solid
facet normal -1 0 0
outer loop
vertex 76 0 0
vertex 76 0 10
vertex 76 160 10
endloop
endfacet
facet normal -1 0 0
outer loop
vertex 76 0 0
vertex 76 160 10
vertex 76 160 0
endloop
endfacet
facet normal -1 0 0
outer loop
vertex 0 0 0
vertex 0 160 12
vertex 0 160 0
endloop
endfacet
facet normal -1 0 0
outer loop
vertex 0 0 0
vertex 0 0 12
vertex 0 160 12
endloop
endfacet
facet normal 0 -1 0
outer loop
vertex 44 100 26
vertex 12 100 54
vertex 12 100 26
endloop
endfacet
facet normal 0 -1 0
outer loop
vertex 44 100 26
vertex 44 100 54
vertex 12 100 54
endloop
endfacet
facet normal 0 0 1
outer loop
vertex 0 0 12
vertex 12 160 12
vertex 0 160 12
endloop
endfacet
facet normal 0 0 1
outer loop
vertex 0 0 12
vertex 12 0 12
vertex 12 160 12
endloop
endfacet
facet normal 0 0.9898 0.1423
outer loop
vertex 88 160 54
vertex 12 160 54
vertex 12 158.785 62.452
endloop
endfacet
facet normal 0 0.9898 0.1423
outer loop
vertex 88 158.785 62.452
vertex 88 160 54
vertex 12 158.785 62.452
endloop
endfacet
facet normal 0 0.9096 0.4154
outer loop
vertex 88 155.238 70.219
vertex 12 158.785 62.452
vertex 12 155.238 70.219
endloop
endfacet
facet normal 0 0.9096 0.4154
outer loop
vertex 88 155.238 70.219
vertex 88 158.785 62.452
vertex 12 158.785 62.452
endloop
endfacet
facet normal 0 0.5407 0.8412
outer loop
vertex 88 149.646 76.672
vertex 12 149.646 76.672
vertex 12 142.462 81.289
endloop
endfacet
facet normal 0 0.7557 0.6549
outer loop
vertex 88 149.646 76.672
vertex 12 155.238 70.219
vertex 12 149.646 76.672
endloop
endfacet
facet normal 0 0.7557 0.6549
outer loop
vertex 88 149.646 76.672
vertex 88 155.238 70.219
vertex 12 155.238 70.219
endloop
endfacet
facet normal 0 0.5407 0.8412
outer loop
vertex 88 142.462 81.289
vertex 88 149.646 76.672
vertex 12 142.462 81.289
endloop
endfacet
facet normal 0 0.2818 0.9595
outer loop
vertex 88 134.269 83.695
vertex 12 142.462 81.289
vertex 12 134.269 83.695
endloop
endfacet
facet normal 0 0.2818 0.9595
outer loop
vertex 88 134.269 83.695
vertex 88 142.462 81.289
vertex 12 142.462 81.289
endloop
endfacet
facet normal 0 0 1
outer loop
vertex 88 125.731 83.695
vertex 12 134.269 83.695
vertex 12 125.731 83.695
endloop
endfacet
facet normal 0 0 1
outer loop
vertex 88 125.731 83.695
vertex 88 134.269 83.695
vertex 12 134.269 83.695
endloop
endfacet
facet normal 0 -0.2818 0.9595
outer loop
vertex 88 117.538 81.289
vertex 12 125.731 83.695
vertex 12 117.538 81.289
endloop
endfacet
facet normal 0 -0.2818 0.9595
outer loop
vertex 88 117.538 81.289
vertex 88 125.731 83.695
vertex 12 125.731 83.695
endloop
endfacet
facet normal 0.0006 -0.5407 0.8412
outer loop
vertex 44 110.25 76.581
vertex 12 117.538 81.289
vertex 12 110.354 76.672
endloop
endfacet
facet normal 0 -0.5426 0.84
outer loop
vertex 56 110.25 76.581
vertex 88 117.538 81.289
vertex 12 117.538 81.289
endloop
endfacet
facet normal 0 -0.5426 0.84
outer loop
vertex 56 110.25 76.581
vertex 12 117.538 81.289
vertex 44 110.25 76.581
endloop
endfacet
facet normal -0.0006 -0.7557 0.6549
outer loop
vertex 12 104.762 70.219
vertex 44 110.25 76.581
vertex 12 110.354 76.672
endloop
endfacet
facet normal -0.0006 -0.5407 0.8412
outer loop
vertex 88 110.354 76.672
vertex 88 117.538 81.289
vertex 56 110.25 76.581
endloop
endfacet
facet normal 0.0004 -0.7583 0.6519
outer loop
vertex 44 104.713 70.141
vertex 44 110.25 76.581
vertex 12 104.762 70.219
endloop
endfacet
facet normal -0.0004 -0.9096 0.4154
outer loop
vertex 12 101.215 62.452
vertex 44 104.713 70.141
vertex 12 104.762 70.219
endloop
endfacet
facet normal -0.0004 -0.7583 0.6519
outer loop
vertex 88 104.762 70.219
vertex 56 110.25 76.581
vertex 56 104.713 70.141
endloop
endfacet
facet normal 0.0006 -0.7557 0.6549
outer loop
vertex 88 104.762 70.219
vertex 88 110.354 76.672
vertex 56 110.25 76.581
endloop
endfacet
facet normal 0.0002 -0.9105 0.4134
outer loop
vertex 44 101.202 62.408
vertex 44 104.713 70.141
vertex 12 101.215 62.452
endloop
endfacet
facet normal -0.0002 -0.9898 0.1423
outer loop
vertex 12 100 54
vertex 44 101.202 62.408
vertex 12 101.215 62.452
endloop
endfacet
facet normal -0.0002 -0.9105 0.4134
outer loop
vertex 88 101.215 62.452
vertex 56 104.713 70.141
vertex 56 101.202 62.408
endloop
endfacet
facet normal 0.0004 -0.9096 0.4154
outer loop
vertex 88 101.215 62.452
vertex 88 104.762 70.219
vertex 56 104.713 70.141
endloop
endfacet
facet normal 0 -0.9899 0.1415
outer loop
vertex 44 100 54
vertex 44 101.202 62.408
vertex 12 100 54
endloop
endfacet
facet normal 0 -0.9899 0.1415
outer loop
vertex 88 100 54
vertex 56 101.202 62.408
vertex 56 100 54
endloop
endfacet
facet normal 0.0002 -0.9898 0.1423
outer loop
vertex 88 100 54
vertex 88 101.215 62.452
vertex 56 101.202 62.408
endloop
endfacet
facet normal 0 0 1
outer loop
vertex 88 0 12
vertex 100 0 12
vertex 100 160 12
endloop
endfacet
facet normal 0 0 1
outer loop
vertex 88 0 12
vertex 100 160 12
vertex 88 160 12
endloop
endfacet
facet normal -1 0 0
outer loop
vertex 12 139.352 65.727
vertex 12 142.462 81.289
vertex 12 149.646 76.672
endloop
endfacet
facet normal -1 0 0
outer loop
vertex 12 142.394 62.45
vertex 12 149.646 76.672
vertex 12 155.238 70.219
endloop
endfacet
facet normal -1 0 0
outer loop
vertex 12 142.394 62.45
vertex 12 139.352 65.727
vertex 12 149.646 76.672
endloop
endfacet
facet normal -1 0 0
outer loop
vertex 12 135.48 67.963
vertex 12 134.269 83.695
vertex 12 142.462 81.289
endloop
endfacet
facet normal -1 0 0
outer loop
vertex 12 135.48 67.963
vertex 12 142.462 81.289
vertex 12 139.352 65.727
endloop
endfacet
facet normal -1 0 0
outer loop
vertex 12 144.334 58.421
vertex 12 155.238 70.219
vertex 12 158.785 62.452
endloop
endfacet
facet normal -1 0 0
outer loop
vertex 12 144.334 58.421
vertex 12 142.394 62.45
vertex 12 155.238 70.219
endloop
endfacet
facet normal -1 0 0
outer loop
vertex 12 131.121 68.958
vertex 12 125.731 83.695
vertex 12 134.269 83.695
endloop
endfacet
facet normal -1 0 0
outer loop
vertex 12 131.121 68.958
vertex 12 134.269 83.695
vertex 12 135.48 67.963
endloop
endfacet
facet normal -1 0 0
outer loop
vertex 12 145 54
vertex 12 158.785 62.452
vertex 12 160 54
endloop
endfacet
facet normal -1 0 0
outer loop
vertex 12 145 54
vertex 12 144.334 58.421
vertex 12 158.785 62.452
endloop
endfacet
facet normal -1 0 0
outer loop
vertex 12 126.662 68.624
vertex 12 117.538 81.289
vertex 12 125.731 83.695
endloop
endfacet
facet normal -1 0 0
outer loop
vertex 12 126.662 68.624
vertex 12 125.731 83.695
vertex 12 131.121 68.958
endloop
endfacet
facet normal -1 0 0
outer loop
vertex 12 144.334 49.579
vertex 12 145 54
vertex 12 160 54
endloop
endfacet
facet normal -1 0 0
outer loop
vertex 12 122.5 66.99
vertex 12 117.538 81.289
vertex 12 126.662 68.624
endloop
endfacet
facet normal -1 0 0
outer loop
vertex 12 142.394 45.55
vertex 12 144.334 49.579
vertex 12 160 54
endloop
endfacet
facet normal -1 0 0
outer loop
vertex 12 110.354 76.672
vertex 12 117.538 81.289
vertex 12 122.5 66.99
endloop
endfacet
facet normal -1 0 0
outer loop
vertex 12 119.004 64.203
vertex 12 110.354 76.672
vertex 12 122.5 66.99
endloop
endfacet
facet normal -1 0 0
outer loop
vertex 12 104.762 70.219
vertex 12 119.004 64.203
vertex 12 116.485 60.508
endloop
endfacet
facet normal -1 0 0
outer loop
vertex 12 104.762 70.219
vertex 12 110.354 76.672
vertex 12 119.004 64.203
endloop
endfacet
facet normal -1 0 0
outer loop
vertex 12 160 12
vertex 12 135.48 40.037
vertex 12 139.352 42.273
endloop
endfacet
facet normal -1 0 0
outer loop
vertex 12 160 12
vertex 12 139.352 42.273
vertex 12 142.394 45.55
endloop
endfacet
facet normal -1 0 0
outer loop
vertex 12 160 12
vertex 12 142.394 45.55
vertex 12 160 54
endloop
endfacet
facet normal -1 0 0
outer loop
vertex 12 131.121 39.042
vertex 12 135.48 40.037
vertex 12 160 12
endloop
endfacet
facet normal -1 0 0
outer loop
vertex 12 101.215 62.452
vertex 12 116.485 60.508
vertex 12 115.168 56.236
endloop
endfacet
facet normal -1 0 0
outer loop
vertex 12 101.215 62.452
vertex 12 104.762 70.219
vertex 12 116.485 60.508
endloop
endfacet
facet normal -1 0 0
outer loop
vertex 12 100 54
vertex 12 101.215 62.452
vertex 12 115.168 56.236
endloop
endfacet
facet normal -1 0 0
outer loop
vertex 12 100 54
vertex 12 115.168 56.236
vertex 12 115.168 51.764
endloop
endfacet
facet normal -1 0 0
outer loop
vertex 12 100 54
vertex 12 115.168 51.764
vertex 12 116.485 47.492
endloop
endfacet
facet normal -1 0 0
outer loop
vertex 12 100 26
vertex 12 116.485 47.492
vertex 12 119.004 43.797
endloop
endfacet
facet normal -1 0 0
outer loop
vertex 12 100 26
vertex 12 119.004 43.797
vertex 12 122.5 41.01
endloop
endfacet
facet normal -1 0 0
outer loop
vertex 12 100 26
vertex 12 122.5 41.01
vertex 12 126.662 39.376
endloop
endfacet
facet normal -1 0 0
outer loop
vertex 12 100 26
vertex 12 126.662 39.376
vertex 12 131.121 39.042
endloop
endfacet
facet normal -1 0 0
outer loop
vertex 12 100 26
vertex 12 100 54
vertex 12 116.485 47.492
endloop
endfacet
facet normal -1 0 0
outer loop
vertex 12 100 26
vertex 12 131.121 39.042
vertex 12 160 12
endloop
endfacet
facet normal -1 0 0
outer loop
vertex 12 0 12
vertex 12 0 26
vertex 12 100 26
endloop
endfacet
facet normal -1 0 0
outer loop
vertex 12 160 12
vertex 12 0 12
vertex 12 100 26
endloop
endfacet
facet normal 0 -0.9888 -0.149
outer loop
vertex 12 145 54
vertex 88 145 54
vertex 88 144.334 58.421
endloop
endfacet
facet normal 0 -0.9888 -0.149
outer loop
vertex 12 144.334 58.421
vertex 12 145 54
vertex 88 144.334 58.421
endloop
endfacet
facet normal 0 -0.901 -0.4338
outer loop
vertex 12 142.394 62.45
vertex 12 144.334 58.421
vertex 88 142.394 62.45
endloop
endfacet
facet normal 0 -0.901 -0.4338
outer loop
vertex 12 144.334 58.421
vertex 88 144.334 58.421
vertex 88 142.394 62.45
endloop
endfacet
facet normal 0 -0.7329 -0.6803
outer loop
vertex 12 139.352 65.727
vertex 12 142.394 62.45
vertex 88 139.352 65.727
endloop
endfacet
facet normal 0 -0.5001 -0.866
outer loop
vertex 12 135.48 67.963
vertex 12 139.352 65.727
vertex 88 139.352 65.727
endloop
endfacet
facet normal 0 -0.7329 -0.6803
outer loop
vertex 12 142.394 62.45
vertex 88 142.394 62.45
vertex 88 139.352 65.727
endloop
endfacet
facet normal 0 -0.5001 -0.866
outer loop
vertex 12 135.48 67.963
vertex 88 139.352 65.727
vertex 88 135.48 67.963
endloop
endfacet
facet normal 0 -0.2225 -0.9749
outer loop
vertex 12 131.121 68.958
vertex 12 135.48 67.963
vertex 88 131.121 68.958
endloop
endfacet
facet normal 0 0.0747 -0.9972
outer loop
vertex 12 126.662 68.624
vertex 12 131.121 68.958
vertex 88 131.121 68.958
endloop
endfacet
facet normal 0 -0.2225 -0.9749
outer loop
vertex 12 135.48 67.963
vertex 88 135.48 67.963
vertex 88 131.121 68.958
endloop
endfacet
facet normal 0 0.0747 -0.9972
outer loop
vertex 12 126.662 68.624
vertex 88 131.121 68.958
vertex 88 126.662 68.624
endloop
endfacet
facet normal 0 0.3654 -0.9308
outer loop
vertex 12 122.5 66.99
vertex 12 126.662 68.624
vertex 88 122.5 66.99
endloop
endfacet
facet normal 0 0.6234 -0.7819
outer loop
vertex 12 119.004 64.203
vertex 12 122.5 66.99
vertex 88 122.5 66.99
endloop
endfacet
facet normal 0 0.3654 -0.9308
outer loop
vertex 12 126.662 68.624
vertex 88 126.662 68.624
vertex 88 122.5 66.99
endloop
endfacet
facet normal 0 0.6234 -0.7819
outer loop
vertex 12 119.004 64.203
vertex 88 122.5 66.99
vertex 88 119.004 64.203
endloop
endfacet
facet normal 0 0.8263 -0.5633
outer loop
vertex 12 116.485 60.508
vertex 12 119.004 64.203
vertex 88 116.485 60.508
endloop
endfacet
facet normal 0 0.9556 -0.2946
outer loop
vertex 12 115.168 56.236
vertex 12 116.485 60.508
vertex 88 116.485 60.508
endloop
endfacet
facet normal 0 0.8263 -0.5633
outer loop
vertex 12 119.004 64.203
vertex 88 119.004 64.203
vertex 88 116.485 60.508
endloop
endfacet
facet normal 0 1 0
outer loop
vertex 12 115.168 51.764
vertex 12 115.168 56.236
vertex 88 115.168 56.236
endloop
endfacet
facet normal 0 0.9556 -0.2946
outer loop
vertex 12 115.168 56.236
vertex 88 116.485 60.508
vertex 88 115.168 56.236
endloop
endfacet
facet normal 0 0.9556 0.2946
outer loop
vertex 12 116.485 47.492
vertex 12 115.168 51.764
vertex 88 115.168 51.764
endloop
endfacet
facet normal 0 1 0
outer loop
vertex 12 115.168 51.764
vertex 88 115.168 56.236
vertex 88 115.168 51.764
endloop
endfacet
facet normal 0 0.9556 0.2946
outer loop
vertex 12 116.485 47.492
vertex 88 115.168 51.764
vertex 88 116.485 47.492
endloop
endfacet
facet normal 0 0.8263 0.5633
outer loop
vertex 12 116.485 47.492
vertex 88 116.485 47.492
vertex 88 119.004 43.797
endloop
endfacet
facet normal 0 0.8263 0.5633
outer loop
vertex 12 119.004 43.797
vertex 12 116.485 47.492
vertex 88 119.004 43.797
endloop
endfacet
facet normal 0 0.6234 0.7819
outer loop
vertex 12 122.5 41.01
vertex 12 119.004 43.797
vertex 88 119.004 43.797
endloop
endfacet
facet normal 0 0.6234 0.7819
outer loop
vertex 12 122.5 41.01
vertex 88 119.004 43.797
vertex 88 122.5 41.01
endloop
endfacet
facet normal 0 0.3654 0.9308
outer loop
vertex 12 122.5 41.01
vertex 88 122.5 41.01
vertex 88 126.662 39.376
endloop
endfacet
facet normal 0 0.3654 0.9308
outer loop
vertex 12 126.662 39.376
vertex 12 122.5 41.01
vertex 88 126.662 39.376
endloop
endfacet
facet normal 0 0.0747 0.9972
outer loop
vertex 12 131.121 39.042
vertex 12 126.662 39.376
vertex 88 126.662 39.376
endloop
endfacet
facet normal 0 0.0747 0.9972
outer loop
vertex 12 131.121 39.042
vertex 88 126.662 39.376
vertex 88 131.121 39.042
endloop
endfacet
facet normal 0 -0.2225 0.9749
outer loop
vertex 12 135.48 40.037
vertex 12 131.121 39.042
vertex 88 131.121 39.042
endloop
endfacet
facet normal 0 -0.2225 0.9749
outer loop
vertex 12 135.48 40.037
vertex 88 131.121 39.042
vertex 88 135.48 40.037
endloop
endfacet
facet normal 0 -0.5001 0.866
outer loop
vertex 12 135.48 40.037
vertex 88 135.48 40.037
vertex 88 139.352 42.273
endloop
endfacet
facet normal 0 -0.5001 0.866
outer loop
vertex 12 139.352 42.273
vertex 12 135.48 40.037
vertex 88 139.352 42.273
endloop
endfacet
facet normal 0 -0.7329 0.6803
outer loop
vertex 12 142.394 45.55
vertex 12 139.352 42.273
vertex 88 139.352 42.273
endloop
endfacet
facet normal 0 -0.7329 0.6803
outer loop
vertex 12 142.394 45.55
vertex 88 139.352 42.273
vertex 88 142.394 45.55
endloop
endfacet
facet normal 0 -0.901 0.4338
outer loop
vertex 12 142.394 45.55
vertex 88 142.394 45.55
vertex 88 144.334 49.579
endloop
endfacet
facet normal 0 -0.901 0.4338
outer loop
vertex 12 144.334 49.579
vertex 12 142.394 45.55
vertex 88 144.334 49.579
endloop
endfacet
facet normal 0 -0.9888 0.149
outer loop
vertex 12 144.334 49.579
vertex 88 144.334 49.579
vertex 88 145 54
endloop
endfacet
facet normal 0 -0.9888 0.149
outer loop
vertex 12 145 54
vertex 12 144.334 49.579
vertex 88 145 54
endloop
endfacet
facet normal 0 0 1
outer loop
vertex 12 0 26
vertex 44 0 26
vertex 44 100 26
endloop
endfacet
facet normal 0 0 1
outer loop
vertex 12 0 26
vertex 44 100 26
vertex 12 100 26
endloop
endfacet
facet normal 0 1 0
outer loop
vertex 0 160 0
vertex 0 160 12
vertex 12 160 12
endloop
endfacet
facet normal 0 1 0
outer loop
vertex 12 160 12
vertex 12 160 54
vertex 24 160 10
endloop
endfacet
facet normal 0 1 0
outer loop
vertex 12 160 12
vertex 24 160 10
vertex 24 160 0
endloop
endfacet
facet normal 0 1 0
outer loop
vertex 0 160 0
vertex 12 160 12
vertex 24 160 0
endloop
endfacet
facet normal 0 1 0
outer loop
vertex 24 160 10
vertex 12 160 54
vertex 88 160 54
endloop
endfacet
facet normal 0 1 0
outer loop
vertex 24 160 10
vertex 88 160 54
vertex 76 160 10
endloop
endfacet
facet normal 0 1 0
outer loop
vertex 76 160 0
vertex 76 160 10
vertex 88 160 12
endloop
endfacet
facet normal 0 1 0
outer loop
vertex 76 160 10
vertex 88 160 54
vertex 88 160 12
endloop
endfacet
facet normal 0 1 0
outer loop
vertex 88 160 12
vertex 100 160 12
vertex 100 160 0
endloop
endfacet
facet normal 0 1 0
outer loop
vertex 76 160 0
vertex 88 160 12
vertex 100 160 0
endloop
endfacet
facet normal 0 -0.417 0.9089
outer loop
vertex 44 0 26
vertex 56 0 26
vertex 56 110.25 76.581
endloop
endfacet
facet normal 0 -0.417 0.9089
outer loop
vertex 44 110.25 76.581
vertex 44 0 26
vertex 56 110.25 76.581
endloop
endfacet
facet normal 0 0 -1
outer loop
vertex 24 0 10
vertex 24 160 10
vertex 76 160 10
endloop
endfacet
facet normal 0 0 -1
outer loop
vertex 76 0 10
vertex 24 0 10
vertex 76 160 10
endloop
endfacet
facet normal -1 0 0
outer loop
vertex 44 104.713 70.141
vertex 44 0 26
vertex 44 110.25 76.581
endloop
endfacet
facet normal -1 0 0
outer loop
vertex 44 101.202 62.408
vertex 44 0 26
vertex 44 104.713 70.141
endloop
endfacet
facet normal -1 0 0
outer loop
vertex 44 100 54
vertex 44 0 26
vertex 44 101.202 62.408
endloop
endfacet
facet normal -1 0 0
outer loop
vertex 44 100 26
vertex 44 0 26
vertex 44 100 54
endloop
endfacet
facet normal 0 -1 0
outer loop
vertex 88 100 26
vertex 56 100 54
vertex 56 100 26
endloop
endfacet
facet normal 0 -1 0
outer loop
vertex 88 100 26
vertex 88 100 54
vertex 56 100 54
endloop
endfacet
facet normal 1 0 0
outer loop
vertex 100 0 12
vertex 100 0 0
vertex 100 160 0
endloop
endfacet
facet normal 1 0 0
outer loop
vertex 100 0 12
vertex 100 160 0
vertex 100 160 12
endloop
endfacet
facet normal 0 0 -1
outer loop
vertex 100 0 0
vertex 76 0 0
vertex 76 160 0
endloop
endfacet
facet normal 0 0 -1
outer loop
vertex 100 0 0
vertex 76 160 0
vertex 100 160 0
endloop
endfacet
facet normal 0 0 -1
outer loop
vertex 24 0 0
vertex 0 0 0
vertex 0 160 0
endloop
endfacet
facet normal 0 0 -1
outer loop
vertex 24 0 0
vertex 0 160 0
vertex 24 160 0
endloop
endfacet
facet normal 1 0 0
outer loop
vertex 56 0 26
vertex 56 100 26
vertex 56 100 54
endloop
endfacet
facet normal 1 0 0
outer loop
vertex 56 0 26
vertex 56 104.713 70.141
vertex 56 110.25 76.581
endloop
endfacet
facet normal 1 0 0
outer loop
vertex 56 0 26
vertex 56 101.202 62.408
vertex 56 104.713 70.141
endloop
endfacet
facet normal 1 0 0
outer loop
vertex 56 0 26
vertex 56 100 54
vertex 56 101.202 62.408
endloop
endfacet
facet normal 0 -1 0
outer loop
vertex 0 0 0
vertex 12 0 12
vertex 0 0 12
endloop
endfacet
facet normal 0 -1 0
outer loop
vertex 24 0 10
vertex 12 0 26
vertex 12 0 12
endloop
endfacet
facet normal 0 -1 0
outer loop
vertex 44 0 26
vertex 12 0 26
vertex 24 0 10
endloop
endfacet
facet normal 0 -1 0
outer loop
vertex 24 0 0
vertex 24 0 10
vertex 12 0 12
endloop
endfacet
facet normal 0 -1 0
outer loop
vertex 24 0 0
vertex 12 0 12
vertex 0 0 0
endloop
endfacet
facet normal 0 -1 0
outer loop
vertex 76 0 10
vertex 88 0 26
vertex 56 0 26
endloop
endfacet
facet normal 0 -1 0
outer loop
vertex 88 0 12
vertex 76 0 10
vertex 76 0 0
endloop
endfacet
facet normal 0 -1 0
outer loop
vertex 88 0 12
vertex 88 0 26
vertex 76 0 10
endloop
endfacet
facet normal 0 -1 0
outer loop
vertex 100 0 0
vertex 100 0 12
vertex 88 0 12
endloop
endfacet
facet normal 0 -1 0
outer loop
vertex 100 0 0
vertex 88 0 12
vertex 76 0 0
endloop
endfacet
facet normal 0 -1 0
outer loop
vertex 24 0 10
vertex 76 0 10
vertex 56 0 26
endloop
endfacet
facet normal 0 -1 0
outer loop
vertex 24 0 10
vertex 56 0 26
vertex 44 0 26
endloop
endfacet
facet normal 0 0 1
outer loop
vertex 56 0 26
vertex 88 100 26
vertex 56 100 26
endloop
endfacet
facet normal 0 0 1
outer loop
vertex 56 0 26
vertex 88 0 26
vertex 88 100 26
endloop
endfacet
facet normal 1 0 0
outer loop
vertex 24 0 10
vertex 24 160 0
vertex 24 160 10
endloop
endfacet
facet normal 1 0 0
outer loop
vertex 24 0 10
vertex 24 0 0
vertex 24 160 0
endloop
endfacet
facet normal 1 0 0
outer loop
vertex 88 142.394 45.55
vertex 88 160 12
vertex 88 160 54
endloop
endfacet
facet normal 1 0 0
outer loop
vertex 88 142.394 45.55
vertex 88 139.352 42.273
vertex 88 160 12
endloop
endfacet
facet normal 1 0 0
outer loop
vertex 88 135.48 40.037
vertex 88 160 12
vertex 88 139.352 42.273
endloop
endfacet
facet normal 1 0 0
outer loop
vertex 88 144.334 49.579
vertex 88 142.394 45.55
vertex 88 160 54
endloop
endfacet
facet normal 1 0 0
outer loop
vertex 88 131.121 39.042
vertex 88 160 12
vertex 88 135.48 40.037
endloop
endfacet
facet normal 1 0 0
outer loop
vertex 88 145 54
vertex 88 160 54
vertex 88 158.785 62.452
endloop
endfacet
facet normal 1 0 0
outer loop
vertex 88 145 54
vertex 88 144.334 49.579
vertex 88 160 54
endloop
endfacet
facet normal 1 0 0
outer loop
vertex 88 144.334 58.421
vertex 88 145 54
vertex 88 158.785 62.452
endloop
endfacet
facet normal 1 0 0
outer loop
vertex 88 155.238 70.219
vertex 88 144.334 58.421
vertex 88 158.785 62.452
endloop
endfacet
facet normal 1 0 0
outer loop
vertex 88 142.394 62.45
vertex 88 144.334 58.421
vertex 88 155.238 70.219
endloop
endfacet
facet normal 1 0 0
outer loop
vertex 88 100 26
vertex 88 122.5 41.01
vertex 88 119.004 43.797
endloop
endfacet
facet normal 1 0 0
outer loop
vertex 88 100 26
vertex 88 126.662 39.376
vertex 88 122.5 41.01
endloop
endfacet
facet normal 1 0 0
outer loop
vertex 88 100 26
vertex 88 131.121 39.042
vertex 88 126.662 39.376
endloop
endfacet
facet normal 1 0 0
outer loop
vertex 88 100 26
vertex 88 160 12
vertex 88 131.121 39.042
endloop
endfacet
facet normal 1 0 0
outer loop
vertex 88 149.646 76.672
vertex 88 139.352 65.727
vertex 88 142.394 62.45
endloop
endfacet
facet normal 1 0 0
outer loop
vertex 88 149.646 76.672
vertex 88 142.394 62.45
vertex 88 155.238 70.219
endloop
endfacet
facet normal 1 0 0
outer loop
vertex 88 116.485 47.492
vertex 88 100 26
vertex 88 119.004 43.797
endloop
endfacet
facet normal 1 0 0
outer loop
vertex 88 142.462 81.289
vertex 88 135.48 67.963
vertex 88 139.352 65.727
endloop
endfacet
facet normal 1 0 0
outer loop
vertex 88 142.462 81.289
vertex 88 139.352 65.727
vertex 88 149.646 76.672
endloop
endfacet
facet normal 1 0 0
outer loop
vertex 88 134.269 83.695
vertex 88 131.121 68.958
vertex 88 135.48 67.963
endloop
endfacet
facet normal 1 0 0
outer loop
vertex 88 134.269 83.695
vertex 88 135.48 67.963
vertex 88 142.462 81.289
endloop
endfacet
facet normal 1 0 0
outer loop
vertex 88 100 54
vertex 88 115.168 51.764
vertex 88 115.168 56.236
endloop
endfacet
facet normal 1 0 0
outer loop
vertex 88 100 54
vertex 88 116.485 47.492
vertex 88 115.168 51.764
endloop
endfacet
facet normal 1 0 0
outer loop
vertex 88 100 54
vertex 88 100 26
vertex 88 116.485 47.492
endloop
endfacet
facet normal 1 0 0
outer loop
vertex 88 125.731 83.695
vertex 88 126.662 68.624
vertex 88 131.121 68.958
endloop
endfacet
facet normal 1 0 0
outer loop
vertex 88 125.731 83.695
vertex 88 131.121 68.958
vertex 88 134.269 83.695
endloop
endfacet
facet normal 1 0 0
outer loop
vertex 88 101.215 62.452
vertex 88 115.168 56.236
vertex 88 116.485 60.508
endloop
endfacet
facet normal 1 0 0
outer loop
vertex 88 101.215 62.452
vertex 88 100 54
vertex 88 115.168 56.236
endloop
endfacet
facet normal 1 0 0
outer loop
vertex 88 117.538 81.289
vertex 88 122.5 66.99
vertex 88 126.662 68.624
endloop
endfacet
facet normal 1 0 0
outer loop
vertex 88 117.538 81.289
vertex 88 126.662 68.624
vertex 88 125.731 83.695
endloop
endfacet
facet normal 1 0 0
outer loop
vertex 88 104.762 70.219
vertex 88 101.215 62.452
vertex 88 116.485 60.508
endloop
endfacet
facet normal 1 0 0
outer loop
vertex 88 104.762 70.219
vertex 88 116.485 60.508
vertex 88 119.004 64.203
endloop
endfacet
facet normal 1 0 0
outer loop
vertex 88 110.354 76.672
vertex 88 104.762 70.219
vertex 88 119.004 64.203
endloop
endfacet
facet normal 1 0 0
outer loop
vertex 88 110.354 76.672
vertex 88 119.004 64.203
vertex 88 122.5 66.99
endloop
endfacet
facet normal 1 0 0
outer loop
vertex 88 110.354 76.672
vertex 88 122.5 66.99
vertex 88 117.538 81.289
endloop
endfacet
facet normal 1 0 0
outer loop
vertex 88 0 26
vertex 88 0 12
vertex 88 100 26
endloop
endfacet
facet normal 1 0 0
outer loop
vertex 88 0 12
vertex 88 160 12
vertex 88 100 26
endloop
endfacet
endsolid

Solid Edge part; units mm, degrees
sketch "Sketch1" plane through (0, 0, 0) normal (0, -1, 0) x (1, 0, 0)
  line L0 (88, 26) -> (12, 26)
  line L1 (12, 26) -> (12, 12)
  line L2 (12, 12) -> (0, 12)
  line L3 (0, 12) -> (0, 0)
  line L4 (0, 0) -> (24, 0)
  line L5 (24, 0) -> (24, 10)
  line L6 (24, 10) -> (76, 10)
  line L7 (76, 10) -> (76, 0)
  line L8 (76, 0) -> (100, 0)
  line L9 (100, 0) -> (100, 12)
  line L10 (100, 12) -> (88, 12)
  line L11 (88, 12) -> (88, 26)
extrude "Protrusion1" add sketch "Sketch1" against normal blind 160
sketch "Sketch2" plane through (50, 80, 10) normal (0, 0, -1) x (1, 0, 0)
  line L0 (-6, 80) -> (-6, -50)
  line L1 (-6, -50) -> (6, -50)
  line L2 (6, -50) -> (6, 80)
  line L3 (6, 80) -> (-6, 80)
extrude "ExtrudedProtrusion_2" add sketch "Sketch2" against normal blind 72
sketch "Sketch3" plane through (88, 80, 19) normal (1, 0, 0) x (0, 1, 0)
  line L0 (80, -7) -> (80, 35)
  line L1 (20, -7) -> (80, -7)
  line L2 (20, 35) -> (20, -7)
  arc A0 (20, 35) -> (80, 35) centre (50, 35) cw
  circle A1 centre (50, 35) radius 15
extrude "ExtrudedProtrusion_3" add sketch "Sketch3" against normal blind 76
sketch "Sketch4" plane through (56, 122.5, 54) normal (1, 0, 0) x (0, 0, 1)
  arc A0 (-15, -7.5) -> (15, -7.5) centre (0, -7.5) cw
  line L0 (15, -7.5) -> (-15, -7.5)
extrude "ExtrudedCutout_1" cut sketch "Sketch4" against normal blind 12 and the other way blind 1
sketch "Sketch5" plane through (56, 59.6148, 54) normal (1, 0, 0) x (0, 1, 0)
  line L0 (-59.6148, 28) -> (59.6148, 28)
  arc A0 (50.6348, 22.5815) -> (59.6148, 28) centre (70.3852, 0) cw
  line L1 (-59.6148, -28) -> (50.6348, 22.5815)
  line L2 (-59.6148, 28) -> (-59.6148, -28)
extrude "ExtrudedCutout_3" cut sketch "Sketch5" against normal blind 12 and the other way blind 1
